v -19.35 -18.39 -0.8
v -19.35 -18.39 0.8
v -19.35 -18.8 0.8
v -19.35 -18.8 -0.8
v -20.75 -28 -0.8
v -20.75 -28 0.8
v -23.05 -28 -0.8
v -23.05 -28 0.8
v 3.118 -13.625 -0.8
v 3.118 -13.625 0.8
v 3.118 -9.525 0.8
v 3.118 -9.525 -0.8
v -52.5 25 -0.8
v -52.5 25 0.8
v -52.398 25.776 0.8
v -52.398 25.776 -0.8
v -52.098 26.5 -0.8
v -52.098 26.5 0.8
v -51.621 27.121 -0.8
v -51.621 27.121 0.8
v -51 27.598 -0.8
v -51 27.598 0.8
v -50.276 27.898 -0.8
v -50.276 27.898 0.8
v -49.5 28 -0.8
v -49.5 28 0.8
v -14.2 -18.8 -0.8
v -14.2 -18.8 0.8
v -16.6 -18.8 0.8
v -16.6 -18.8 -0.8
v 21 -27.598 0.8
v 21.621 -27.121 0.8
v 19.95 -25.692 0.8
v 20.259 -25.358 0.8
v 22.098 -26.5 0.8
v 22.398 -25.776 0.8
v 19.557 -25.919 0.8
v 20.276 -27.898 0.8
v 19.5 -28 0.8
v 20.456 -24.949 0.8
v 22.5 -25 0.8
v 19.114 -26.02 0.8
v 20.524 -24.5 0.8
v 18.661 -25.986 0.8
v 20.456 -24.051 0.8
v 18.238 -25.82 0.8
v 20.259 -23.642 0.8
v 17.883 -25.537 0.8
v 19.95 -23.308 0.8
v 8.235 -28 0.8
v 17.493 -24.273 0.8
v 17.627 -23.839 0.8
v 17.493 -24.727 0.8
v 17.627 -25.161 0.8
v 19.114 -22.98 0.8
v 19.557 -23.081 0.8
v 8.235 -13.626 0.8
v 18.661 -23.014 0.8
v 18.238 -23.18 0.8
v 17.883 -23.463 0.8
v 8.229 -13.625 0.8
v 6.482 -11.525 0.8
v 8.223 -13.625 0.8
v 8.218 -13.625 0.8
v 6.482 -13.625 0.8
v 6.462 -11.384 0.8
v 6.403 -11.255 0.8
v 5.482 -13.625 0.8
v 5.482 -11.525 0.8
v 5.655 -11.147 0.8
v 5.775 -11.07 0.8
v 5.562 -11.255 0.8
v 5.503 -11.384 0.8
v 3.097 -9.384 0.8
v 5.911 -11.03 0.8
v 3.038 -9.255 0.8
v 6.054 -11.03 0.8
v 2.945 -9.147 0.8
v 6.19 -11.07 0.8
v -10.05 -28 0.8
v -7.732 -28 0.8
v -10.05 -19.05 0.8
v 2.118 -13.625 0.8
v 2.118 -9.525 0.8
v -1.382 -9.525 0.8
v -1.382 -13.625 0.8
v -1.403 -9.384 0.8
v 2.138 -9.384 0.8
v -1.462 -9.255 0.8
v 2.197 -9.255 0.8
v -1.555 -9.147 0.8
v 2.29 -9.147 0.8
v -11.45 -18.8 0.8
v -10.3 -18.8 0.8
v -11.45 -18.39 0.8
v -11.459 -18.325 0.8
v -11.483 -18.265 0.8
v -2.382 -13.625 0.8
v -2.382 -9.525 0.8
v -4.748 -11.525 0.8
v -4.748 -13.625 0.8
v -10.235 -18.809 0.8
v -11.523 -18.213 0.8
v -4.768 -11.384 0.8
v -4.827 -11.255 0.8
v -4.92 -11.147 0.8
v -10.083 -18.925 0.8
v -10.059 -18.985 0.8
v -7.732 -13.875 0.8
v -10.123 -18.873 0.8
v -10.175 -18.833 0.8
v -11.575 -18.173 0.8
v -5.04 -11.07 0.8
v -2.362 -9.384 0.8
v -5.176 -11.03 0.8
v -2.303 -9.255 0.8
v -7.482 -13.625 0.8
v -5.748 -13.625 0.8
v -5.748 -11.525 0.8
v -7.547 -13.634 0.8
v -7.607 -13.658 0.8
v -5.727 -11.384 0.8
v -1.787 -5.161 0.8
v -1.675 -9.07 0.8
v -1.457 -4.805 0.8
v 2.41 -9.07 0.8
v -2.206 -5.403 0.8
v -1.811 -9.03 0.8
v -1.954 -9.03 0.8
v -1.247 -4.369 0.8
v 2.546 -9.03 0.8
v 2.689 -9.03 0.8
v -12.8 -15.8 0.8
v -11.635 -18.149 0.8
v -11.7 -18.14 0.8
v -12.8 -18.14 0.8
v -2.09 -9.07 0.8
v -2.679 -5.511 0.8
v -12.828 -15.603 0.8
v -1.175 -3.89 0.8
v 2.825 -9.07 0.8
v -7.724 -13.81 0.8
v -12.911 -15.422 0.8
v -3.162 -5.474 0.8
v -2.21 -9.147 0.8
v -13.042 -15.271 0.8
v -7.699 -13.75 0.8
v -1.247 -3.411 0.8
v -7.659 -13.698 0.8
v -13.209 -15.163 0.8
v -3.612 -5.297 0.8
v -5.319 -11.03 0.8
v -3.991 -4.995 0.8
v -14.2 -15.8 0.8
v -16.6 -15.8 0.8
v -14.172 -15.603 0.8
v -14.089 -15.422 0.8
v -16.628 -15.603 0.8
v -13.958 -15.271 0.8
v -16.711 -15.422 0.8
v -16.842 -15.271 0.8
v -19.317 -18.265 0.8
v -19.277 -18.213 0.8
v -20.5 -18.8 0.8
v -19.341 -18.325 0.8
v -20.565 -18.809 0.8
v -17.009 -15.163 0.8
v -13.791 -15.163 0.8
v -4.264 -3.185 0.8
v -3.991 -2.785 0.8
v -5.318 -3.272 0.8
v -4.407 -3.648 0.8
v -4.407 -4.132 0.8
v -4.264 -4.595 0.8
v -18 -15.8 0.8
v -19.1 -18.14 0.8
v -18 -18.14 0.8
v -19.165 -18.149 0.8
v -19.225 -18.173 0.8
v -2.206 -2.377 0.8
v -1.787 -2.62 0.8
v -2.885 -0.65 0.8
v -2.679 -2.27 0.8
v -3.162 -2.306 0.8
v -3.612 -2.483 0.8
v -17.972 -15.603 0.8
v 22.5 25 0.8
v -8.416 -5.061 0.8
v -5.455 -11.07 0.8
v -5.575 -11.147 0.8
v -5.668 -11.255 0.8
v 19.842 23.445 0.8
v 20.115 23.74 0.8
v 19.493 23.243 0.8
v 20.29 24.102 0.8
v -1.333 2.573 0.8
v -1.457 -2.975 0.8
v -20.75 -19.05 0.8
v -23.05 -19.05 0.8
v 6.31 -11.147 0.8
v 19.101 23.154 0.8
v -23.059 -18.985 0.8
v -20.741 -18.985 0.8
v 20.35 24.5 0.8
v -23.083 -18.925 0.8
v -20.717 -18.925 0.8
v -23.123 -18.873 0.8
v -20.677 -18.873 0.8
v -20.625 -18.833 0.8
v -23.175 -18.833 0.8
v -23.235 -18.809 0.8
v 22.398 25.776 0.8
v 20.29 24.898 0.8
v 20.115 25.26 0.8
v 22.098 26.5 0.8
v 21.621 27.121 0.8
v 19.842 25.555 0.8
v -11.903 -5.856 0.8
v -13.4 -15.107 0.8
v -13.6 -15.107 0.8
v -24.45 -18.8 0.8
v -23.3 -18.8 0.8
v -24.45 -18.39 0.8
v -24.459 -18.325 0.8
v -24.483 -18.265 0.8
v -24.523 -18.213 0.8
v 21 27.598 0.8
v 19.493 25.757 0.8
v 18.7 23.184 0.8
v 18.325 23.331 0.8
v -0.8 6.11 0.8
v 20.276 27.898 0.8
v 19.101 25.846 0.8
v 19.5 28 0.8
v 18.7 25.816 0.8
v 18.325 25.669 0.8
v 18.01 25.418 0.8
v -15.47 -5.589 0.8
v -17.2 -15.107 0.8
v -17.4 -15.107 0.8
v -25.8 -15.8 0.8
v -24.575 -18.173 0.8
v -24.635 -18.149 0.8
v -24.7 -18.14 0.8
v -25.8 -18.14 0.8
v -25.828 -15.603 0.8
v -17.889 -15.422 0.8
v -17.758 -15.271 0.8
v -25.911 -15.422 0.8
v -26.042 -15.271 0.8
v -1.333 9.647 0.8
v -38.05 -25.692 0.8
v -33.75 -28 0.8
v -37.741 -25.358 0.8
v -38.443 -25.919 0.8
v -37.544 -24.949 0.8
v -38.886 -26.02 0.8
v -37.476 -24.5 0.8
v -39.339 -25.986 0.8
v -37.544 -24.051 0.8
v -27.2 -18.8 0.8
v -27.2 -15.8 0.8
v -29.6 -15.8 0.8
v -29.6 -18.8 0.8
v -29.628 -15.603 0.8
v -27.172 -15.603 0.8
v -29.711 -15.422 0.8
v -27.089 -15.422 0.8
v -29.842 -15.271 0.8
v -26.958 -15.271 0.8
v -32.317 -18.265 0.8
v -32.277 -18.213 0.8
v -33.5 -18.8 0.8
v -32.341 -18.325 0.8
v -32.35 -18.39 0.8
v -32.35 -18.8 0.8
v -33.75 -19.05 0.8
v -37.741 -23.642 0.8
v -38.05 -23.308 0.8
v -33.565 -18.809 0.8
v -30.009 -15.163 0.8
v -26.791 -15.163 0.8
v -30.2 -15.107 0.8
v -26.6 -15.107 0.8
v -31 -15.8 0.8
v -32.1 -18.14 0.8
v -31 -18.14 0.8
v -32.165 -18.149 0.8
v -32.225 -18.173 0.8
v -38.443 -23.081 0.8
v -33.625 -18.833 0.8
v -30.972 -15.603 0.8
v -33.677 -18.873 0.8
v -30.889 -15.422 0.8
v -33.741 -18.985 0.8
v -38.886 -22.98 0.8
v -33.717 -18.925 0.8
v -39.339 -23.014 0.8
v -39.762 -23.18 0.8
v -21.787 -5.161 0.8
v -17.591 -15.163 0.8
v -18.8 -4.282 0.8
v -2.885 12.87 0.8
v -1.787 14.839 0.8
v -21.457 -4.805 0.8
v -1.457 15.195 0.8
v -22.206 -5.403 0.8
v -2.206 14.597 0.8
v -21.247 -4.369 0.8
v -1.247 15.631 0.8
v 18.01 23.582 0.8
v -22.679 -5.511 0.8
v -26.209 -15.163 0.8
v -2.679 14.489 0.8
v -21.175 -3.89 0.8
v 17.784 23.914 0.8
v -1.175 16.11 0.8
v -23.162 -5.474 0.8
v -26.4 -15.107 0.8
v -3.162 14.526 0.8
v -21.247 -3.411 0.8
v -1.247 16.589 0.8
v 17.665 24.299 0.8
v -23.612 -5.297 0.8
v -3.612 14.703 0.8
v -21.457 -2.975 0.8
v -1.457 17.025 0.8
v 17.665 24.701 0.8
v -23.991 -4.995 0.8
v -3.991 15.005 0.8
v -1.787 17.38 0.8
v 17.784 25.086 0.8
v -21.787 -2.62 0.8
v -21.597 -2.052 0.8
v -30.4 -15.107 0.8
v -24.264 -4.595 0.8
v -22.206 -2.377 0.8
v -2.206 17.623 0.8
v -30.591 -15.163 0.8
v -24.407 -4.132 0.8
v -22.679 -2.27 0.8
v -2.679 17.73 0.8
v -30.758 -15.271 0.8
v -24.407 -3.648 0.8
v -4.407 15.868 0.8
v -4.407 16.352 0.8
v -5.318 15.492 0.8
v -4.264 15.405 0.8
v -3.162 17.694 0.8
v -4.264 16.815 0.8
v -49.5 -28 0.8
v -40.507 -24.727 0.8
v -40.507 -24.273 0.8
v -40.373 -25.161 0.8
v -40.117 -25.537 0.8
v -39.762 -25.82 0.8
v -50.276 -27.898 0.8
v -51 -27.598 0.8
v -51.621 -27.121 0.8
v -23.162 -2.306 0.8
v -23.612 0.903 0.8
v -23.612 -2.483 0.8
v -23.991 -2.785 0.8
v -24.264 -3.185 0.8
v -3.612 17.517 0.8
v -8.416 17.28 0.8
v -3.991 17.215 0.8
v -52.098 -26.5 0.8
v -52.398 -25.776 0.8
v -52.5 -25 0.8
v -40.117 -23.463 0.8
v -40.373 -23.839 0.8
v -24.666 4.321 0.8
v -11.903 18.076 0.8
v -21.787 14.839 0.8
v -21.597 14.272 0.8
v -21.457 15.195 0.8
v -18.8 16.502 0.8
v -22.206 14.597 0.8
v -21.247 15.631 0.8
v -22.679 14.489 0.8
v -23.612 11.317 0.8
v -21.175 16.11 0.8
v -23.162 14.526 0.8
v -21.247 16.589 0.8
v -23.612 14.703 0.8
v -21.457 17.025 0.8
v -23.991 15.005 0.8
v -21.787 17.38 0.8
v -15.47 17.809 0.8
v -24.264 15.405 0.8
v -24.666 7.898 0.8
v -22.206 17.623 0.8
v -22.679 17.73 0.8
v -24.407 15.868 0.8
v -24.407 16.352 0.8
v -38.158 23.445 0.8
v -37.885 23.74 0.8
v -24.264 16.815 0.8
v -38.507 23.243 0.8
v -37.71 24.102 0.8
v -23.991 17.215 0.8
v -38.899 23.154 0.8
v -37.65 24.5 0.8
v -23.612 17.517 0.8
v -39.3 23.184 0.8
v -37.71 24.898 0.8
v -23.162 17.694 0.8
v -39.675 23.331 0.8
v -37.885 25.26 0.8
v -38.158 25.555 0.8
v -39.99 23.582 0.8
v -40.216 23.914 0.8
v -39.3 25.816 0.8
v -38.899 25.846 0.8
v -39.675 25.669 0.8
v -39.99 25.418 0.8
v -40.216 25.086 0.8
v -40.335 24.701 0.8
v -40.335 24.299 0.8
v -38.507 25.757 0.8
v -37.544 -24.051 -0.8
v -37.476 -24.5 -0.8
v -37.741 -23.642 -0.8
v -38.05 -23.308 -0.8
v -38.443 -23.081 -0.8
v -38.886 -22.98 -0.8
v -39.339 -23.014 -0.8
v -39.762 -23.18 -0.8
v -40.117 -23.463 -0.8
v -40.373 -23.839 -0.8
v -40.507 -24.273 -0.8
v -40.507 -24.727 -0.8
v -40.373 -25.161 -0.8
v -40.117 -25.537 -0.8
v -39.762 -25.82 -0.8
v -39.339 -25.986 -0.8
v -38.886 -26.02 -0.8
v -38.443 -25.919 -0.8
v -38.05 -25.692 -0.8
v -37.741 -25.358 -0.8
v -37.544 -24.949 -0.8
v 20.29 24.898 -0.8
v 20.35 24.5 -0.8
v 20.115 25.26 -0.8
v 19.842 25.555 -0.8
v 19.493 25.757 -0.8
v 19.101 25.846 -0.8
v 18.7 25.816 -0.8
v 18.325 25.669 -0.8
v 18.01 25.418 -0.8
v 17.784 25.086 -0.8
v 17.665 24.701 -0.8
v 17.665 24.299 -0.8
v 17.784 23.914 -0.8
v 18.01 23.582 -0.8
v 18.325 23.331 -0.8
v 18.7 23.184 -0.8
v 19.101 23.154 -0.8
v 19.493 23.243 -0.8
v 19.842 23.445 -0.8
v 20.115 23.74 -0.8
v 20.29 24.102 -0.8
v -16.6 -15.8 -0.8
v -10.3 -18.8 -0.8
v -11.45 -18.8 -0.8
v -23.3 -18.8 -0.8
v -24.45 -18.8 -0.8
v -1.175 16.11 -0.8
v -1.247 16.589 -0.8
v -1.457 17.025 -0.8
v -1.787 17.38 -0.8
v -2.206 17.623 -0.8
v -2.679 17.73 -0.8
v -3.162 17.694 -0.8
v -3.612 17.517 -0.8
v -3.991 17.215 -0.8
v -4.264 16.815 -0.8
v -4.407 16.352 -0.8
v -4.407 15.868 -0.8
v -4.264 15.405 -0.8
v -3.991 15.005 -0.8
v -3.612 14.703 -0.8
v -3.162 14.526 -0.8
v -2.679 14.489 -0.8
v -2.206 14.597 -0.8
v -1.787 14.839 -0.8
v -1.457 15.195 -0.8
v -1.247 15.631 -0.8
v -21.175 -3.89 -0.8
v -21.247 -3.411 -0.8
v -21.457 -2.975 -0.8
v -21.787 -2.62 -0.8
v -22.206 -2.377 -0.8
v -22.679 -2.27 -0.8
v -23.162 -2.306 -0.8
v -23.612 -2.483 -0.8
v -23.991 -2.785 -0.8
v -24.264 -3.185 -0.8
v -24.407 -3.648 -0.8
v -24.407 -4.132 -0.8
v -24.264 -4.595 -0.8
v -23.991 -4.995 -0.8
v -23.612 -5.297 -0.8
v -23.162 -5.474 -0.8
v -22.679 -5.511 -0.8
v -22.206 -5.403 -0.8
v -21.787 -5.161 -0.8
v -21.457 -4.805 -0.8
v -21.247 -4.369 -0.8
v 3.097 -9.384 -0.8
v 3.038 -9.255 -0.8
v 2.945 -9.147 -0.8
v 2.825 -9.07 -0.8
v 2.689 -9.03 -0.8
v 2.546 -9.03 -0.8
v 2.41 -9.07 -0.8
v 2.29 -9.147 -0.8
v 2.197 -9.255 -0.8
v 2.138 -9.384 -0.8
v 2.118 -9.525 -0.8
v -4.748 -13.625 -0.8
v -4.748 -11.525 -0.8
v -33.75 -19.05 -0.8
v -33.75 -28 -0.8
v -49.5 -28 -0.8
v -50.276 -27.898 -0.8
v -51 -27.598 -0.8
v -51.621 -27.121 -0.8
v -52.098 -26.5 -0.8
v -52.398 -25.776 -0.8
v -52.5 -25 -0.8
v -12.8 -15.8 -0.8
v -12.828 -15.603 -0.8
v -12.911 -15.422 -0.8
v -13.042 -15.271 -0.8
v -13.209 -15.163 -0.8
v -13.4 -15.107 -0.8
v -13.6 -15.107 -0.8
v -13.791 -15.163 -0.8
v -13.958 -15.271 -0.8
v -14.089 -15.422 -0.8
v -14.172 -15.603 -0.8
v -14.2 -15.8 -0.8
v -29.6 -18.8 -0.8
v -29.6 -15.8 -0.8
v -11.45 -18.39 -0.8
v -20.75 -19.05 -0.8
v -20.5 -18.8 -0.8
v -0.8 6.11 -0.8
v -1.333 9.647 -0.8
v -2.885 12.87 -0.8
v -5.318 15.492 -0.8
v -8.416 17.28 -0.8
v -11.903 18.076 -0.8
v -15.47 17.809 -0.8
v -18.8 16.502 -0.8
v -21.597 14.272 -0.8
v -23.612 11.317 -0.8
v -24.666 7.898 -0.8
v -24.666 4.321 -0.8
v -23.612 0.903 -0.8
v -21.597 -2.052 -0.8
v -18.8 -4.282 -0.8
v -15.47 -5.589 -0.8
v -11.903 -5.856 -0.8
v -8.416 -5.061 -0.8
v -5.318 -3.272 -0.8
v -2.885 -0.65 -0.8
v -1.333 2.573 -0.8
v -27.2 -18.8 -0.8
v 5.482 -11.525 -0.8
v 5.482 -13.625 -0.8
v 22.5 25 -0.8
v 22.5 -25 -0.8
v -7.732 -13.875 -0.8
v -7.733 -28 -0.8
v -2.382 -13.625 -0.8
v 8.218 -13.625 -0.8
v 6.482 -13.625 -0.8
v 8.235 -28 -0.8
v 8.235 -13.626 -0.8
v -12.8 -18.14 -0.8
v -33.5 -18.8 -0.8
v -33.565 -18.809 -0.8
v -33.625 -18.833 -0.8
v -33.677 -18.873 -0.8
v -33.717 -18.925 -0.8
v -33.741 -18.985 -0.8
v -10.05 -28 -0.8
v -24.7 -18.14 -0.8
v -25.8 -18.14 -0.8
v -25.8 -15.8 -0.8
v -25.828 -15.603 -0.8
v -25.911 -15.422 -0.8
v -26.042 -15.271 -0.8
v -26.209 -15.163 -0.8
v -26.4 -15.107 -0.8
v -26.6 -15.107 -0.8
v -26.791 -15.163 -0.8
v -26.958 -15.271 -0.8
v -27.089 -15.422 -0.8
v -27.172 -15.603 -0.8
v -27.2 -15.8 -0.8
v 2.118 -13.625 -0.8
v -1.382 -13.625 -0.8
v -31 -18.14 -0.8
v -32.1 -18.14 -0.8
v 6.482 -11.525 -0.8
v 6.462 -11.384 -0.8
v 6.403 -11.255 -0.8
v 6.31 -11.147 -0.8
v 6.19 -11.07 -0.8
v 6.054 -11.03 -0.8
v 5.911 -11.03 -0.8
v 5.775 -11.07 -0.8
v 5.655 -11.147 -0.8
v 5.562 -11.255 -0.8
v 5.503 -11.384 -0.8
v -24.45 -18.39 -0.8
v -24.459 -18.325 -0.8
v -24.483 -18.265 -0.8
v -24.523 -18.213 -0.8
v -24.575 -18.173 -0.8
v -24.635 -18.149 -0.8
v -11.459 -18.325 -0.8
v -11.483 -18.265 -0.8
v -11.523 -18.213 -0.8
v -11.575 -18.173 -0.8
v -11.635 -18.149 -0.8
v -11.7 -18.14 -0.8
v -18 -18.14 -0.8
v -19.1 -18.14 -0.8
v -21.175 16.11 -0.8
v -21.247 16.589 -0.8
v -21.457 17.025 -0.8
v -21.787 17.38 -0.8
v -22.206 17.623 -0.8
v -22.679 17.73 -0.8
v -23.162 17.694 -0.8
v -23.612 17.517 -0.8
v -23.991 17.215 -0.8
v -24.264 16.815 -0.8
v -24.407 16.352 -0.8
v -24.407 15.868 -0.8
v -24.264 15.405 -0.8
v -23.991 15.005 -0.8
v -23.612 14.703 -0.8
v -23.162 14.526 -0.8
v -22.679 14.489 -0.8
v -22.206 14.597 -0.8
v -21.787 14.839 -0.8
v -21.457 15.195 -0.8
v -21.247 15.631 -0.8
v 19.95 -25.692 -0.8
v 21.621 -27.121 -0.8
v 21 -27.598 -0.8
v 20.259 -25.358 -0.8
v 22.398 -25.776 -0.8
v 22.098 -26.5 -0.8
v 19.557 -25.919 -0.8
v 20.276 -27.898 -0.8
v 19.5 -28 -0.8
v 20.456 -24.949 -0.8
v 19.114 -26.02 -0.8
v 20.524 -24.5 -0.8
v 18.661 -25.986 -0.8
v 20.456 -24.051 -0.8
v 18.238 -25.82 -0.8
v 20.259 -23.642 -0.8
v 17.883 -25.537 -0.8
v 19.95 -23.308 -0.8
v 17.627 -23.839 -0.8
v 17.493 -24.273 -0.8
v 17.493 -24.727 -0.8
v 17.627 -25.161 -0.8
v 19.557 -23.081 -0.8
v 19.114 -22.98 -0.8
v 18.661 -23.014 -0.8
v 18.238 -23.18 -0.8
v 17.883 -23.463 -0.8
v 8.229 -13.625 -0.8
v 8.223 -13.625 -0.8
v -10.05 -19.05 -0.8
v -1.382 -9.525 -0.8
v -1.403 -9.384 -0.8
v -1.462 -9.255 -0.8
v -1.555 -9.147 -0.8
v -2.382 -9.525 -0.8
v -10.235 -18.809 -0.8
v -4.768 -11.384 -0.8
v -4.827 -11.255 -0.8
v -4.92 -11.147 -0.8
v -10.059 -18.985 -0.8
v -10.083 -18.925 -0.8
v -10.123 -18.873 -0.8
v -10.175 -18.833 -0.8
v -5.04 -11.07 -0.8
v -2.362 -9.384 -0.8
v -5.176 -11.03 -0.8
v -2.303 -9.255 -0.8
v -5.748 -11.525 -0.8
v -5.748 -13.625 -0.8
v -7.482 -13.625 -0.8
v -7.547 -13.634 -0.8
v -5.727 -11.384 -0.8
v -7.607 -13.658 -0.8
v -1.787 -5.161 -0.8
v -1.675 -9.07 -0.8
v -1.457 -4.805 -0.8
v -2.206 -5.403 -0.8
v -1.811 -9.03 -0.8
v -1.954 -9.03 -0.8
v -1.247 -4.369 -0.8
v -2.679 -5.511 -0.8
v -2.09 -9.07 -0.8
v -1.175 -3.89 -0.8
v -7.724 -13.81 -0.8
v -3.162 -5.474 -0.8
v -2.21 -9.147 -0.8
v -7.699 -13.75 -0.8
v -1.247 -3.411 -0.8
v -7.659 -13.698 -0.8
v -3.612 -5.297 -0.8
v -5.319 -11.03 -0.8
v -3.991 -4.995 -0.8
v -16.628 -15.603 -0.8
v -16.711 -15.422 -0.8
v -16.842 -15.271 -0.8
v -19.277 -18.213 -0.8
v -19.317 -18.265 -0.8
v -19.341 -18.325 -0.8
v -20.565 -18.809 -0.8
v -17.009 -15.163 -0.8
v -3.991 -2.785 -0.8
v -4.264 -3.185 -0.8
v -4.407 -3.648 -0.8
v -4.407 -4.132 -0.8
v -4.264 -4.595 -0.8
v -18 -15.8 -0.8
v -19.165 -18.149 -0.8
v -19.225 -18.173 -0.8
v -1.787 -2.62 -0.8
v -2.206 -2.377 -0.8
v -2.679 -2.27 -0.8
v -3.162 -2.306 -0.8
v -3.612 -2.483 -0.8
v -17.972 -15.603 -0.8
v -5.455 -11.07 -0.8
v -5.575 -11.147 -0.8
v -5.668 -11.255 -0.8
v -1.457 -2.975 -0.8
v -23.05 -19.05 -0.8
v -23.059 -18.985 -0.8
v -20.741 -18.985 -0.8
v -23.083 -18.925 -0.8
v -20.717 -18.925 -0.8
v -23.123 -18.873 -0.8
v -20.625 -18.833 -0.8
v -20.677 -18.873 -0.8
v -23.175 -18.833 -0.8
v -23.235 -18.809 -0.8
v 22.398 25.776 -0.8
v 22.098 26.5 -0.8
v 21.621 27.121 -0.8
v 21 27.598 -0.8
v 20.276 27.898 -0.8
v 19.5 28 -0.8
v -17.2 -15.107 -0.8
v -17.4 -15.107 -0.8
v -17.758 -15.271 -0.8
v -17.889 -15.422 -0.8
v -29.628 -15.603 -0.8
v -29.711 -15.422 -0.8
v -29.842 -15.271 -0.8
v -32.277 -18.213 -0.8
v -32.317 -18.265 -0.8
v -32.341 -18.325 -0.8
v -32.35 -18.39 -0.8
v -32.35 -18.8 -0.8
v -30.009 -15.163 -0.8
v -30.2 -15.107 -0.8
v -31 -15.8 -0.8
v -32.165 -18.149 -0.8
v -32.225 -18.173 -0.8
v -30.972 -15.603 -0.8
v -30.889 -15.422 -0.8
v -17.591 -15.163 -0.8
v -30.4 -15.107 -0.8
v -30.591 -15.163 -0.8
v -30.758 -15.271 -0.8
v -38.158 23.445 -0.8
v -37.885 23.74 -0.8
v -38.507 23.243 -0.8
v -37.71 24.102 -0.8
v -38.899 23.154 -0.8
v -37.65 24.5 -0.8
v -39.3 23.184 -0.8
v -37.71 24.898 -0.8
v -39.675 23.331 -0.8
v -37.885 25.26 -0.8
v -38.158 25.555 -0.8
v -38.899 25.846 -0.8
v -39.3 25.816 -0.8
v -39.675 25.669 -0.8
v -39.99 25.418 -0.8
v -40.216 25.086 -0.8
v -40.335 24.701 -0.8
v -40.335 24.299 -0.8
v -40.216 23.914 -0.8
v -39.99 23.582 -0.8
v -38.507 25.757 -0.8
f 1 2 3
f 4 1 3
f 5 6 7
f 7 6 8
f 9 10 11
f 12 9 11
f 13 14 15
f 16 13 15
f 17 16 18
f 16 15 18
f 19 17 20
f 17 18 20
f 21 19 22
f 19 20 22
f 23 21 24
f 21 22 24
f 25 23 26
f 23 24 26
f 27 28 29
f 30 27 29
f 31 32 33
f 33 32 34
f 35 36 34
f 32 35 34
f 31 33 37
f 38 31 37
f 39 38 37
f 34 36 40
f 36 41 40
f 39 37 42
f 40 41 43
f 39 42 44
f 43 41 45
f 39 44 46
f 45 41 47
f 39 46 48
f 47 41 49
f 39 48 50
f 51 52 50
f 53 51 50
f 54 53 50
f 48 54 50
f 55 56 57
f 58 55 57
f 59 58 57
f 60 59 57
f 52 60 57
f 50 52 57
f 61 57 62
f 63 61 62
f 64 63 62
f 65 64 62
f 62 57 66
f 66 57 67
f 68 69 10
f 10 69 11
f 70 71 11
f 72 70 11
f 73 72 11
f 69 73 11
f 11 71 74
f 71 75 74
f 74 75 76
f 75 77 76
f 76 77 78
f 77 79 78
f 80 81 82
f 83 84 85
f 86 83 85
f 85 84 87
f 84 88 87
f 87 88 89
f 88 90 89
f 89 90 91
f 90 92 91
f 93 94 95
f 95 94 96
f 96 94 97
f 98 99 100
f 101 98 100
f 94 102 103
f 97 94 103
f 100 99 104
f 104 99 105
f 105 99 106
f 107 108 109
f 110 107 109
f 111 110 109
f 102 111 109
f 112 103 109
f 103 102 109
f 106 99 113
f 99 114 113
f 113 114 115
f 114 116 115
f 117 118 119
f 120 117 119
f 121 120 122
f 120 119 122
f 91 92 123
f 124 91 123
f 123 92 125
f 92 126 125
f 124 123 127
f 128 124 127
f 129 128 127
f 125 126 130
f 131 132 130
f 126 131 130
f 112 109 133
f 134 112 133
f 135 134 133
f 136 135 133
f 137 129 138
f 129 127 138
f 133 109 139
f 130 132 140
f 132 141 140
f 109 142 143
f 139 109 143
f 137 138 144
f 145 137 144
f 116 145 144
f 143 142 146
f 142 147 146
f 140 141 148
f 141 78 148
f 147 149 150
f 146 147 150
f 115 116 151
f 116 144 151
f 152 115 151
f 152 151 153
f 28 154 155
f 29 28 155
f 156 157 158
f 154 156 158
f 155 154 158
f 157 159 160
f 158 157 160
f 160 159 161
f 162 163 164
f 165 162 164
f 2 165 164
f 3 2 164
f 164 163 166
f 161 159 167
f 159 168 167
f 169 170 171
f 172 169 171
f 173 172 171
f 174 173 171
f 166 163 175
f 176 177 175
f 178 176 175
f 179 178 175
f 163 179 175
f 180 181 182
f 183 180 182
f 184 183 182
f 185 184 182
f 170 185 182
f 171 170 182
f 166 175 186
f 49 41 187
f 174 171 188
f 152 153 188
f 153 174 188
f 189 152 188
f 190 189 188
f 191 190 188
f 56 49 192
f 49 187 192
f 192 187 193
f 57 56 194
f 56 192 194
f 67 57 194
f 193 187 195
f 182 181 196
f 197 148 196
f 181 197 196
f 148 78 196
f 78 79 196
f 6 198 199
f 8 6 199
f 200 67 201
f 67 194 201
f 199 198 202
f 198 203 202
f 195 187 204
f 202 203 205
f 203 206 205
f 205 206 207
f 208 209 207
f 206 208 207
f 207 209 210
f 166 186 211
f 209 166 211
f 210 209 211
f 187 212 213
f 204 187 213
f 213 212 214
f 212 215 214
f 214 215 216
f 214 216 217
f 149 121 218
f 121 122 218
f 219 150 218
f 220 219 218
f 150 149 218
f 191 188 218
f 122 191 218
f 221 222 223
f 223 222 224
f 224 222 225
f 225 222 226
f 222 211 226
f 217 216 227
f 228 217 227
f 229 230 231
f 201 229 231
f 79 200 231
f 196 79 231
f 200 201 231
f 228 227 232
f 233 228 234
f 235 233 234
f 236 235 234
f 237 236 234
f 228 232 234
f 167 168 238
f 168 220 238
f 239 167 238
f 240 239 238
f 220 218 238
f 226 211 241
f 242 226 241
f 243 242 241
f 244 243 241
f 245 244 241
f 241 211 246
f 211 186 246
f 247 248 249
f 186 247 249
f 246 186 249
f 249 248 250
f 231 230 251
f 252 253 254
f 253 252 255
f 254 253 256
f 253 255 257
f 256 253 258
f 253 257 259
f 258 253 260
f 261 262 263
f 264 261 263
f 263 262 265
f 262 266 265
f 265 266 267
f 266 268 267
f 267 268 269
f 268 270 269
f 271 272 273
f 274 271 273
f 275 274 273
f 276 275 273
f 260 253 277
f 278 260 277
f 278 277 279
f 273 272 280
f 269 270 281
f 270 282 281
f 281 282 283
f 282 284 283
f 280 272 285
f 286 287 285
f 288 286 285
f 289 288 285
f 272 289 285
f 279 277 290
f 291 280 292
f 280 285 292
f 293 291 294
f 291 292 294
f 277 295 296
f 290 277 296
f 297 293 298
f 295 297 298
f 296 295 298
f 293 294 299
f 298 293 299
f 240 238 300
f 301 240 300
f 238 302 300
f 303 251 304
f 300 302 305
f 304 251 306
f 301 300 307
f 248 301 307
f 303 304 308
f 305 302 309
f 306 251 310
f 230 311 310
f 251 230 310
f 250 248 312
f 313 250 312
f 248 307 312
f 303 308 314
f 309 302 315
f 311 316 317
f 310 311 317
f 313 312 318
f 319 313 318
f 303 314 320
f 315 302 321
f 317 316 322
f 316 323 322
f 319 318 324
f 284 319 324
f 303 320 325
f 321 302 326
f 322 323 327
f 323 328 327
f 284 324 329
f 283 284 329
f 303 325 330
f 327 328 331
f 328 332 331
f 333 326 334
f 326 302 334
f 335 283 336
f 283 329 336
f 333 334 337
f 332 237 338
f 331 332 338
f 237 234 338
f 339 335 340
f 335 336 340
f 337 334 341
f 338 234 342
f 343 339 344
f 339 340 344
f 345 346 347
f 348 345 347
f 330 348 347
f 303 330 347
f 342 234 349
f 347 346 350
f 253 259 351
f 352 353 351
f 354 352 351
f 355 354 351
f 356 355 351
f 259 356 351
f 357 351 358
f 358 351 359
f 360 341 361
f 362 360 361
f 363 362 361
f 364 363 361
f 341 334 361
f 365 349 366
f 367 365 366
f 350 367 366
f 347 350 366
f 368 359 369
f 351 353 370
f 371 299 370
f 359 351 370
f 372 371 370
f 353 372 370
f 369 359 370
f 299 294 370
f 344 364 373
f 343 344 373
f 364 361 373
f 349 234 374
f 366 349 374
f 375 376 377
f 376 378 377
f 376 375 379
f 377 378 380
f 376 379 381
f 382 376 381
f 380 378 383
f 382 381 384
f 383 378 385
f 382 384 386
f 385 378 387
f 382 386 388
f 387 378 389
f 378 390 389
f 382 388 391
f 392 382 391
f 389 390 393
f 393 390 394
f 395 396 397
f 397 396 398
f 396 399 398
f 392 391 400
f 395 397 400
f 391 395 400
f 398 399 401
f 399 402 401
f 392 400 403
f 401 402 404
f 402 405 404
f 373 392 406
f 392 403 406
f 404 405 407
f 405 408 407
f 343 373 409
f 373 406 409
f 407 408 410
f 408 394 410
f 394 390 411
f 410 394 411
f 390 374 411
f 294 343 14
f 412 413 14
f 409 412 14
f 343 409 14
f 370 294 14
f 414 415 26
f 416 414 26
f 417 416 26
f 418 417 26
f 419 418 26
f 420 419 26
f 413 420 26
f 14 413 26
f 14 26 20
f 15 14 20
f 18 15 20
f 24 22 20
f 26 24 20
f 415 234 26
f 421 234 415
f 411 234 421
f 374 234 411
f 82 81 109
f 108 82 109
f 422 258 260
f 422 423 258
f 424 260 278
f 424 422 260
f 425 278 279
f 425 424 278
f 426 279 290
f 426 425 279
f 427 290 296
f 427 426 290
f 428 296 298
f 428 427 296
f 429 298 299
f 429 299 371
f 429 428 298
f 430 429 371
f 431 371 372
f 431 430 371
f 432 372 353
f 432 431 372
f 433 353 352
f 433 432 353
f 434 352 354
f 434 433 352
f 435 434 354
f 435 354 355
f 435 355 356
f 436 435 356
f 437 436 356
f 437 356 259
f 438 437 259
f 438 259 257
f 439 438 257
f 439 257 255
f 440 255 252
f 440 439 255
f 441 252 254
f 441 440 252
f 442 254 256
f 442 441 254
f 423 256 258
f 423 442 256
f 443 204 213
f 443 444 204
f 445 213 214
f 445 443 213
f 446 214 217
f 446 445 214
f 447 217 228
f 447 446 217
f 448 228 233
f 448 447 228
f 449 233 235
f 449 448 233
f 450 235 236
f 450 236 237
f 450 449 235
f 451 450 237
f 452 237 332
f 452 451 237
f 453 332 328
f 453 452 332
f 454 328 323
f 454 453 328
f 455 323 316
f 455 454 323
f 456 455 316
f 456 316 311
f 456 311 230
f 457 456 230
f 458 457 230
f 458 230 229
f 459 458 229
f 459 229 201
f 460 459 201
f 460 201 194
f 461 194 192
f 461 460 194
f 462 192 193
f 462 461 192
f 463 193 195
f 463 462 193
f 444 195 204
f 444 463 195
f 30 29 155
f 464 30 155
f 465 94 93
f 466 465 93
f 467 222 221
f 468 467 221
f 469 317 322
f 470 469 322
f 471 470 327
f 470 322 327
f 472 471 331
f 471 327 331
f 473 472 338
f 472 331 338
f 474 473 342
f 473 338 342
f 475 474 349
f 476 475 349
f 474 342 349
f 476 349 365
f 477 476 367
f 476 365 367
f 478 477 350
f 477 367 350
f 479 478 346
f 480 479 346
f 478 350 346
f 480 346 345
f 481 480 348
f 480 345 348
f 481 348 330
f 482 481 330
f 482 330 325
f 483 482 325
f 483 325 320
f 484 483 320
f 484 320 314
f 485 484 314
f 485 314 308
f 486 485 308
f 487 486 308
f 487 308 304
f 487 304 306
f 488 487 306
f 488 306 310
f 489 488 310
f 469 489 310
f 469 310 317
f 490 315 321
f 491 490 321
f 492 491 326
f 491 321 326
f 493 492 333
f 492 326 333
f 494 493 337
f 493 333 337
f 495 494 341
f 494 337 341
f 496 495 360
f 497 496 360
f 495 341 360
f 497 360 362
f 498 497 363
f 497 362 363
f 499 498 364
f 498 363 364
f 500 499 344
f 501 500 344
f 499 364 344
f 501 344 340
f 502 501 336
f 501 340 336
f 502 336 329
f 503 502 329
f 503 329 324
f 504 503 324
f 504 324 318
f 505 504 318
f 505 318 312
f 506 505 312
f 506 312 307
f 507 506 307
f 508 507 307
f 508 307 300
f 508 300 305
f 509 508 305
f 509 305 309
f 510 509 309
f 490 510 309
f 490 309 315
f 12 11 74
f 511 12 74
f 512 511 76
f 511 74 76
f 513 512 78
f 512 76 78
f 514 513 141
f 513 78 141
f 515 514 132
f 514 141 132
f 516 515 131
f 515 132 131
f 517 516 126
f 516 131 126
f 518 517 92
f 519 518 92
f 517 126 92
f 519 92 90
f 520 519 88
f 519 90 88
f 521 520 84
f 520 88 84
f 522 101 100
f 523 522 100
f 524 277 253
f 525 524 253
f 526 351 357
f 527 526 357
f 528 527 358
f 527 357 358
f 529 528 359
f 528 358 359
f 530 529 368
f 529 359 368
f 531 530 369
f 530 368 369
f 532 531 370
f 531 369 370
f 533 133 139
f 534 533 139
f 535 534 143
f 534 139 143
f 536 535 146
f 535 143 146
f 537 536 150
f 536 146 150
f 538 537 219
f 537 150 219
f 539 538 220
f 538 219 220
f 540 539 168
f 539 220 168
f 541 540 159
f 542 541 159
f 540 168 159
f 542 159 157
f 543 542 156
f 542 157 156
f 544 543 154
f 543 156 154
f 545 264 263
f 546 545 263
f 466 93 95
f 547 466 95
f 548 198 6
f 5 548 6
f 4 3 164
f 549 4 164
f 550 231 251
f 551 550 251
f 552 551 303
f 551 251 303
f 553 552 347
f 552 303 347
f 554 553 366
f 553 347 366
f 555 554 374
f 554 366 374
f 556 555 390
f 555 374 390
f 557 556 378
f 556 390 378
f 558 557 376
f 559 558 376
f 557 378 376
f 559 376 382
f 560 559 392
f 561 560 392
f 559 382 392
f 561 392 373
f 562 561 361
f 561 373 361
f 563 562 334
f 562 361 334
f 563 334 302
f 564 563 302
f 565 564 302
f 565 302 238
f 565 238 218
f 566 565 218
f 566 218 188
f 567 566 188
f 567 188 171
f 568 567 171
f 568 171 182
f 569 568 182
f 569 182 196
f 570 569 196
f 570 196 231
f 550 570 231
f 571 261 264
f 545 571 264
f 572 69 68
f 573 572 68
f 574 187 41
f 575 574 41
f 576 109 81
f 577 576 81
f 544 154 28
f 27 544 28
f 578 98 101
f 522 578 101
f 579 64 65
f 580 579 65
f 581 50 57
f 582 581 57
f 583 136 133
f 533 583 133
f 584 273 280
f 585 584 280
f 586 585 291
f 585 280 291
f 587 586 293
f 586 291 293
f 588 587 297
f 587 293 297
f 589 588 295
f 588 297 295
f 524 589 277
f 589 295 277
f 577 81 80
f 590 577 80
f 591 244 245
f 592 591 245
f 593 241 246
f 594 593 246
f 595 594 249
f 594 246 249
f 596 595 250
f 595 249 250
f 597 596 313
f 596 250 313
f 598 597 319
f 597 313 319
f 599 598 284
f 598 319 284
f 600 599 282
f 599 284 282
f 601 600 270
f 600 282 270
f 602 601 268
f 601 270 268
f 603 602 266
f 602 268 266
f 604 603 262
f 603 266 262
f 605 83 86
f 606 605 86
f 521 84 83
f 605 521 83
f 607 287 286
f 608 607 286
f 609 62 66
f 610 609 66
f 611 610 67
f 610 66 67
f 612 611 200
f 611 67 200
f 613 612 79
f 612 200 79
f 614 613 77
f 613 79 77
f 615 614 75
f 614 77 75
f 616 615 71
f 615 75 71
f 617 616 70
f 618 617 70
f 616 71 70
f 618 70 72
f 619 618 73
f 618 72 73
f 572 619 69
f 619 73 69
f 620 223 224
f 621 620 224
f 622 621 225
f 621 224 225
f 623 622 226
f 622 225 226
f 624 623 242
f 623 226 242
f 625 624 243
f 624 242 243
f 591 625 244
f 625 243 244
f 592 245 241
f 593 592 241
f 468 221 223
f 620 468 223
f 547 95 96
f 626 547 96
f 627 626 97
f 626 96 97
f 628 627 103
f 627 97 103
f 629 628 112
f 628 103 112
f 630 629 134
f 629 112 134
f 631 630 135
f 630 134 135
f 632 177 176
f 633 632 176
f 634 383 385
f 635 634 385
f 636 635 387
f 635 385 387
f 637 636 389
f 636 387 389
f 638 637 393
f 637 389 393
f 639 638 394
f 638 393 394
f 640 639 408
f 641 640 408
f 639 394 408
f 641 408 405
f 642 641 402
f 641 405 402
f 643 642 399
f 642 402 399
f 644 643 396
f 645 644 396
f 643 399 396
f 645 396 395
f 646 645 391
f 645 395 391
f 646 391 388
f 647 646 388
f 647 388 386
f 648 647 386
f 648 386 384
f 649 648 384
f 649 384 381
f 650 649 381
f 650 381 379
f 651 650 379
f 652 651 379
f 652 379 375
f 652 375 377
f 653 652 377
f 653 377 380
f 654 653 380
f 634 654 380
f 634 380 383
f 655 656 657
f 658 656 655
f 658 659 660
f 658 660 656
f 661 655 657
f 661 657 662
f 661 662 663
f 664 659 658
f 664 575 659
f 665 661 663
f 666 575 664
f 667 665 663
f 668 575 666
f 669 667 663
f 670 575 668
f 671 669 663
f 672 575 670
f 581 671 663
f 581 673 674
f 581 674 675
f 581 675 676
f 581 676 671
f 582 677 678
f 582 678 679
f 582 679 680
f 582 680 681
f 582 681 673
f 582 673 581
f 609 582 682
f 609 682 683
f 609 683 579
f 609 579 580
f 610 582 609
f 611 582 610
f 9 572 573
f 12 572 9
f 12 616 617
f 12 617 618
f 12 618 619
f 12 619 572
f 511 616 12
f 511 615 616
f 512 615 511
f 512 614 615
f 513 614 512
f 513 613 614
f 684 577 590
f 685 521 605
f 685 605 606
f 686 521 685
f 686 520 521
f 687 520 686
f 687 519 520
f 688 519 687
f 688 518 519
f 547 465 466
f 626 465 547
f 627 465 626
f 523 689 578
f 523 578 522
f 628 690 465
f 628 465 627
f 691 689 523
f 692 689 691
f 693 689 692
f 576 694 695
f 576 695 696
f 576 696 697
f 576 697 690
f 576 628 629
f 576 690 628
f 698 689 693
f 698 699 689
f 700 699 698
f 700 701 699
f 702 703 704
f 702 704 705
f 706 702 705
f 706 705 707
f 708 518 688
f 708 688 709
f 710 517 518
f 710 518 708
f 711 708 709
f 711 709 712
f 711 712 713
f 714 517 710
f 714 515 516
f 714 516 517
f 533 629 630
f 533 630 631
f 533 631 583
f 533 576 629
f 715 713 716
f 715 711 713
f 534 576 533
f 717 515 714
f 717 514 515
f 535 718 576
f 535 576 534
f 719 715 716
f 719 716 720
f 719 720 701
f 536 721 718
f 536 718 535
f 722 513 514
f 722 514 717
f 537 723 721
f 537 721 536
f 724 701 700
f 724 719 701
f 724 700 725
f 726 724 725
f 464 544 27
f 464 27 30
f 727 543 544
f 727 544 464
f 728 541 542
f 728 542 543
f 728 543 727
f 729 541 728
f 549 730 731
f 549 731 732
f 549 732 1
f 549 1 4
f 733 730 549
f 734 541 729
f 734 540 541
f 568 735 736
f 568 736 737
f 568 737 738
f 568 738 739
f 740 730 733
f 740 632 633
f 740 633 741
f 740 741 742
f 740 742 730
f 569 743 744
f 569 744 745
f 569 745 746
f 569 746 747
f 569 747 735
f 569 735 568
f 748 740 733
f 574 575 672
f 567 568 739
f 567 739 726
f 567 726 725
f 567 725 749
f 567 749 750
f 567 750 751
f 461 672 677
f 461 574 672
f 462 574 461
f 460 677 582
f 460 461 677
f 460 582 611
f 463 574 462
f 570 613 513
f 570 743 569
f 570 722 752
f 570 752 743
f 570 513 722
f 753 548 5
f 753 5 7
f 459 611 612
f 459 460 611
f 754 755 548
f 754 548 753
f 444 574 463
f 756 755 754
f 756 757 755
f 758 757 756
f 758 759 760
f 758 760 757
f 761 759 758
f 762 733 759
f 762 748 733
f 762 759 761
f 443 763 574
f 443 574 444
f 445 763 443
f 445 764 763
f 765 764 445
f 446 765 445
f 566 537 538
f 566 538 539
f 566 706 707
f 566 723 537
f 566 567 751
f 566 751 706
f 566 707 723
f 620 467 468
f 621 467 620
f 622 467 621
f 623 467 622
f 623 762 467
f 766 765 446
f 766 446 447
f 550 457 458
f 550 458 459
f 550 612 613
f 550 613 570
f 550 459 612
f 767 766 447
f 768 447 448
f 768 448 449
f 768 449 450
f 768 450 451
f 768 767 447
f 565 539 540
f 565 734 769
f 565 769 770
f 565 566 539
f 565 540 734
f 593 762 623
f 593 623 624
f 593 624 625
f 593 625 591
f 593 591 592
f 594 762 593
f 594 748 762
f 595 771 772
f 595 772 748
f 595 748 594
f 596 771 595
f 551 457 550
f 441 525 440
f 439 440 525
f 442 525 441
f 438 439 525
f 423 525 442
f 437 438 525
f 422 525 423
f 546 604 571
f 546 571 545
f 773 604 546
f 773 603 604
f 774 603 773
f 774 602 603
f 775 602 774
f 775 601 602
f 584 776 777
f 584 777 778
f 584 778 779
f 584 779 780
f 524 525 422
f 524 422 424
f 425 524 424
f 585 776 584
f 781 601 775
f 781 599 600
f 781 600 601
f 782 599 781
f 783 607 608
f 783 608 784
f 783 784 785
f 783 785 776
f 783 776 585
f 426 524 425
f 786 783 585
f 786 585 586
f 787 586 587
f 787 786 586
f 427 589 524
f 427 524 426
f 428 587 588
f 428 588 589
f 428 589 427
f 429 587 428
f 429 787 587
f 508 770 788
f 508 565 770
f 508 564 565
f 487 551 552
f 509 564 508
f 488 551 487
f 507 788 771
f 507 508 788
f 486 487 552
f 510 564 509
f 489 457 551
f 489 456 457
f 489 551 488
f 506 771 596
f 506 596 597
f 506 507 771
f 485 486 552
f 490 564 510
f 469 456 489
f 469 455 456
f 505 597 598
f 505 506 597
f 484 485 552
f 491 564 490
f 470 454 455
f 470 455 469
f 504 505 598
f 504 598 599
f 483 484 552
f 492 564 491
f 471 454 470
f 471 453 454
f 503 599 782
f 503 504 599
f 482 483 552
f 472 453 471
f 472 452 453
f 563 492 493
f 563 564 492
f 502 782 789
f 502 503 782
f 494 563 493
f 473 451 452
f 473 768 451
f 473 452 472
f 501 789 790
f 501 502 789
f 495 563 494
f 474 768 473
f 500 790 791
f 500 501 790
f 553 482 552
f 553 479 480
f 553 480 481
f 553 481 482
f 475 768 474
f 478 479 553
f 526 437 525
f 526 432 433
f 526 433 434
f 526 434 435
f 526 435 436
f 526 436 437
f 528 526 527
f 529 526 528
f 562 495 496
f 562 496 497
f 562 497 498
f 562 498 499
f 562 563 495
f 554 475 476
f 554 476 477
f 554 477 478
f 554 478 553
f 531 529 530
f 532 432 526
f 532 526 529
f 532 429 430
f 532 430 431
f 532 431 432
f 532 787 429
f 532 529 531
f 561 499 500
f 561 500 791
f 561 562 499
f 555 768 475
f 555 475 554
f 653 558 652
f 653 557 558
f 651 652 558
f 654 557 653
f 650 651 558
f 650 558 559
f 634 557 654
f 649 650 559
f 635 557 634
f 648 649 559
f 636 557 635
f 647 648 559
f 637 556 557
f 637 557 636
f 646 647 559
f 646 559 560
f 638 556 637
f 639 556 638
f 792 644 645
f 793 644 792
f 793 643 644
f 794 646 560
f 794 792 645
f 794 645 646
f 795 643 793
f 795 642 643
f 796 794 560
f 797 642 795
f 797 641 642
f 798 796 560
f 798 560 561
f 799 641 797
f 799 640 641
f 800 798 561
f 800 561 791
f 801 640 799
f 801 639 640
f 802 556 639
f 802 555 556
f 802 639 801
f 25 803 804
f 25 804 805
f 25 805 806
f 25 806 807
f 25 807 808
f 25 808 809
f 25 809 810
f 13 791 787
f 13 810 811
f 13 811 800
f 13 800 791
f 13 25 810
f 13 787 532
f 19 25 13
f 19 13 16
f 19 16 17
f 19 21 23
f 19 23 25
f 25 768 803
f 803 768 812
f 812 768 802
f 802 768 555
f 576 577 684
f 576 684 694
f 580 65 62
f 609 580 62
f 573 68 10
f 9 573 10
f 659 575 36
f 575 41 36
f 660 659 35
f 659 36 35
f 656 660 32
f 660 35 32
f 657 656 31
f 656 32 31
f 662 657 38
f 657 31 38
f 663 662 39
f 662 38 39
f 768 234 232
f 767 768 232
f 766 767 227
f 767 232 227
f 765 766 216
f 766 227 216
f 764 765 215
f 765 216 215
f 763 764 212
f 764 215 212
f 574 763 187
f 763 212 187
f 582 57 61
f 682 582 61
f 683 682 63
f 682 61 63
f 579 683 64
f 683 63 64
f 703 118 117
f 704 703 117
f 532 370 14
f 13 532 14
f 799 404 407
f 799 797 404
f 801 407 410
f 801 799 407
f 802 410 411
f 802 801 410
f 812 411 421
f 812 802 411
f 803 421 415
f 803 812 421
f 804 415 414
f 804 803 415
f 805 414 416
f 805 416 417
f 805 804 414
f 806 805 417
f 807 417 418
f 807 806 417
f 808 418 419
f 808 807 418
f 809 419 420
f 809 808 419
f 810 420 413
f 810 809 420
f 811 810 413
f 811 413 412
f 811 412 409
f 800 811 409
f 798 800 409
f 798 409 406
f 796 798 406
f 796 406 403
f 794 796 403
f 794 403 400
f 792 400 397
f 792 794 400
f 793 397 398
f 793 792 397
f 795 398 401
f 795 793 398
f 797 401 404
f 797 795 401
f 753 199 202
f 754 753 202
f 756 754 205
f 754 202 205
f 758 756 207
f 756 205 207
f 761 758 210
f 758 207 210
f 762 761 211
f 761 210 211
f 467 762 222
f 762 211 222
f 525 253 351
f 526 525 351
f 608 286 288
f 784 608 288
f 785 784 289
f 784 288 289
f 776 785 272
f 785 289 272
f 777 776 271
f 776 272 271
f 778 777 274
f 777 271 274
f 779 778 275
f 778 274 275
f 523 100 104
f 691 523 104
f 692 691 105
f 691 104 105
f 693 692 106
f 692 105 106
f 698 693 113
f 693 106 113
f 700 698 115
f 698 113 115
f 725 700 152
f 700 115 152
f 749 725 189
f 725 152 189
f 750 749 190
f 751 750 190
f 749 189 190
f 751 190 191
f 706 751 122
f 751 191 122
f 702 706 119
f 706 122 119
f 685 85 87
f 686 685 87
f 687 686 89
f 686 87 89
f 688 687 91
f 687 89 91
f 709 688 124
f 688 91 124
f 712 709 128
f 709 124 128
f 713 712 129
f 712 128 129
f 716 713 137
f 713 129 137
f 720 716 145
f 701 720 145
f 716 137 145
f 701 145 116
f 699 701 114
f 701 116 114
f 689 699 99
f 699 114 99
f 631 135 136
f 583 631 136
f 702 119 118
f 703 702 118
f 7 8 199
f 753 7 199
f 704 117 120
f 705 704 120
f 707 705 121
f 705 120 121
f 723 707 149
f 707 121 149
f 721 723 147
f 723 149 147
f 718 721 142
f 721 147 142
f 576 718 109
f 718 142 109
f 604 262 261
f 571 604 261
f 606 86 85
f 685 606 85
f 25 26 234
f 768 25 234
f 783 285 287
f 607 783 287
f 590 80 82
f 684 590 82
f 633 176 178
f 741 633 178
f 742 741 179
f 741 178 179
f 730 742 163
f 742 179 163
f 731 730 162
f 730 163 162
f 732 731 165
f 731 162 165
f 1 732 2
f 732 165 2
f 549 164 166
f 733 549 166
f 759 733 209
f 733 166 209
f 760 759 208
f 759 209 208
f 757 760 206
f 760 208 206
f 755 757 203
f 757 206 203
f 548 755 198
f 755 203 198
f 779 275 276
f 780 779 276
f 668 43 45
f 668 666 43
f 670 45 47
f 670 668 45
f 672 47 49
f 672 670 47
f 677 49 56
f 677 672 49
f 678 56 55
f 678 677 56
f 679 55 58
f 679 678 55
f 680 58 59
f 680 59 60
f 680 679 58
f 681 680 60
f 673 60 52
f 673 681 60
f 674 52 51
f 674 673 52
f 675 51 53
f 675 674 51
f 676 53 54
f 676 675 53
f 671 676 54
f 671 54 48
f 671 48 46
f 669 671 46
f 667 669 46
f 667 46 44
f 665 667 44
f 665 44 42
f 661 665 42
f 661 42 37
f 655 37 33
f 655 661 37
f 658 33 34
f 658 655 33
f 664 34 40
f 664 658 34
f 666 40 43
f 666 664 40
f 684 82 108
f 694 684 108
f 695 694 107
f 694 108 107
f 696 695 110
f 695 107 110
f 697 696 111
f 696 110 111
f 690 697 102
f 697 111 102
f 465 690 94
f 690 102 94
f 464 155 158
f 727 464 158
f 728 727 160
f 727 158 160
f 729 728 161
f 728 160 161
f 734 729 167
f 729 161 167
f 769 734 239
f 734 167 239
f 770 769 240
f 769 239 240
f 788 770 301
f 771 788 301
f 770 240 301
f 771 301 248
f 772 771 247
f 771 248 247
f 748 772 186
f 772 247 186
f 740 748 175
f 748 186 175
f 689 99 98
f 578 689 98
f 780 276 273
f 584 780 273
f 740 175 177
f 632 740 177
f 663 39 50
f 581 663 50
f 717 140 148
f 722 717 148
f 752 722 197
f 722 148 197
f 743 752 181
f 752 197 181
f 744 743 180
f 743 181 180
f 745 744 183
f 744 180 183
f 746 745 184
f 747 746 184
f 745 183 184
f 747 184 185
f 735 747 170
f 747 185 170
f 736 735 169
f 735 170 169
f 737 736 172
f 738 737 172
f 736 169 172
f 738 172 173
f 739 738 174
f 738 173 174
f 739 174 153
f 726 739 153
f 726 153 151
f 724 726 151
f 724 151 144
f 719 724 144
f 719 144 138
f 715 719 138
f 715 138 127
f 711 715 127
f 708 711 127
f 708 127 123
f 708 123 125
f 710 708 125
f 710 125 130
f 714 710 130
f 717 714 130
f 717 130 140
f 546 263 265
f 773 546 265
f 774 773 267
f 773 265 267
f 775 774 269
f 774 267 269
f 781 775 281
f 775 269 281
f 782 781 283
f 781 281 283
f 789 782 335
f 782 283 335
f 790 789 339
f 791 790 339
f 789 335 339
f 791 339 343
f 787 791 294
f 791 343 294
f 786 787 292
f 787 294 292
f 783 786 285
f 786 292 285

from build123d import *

# Parameters (mm, degrees)
SKETCH1_R           = 1.35
SKETCH1_R_2         = 1.524
BOSS_EXTRUDE1_DEPTH = 0.8
SKETCH2_R           = 1.625
SKETCH2_R_2         = 12
CUT_EXTRUDE1_DEPTH  = 51.919642575
BOSS_EXTRUDE2_DEPTH = 1.6
CUT_EXTRUDE2_DEPTH  = 60.521508717


with BuildPart() as part:
    # Sketch1 → Boss-Extrude1 (new, symmetric)
    with BuildSketch(Plane.XY):
        with BuildLine():
            Line((22.5, 25), (22.5, -25))
            ThreePointArc((22.5, -25), (21.621320344, -27.121320344), (19.5, -28))
            Line((19.5, -28), (-39.5, -28))
            ThreePointArc((-39.5, -28), (-41.621320344, -27.121320344), (-42.5, -25))
            Line((-42.5, -25), (-42.5, 25))
            ThreePointArc((-42.5, 25), (-41.621320344, 27.121320344), (-39.5, 28))
            Line((-39.5, 28), (19.5, 28))
            ThreePointArc((19.5, 28), (21.621320344, 27.121320344), (22.5, 25))
        make_face()
        with Locations((-39, 24.5)):
            Circle(SKETCH1_R, mode=Mode.SUBTRACT)
        with Locations((-39, -24.5)):
            Circle(SKETCH1_R_2, mode=Mode.SUBTRACT)
        with Locations((19, -24.5)):
            Circle(SKETCH1_R_2, mode=Mode.SUBTRACT)
        with Locations((19, 24.5)):
            Circle(SKETCH1_R, mode=Mode.SUBTRACT)
    extrude(amount=BOSS_EXTRUDE1_DEPTH, both=True)

    # Sketch2 → Cut-Extrude1 (cut, through all)
    with BuildSketch(Plane.XY.offset(0.8)):
        with Locations((-2.799944405, 16.10995525)):
            Circle(SKETCH2_R)
        with Locations((-22.799944405, 16.10995525)):
            Circle(SKETCH2_R)
        with Locations((-22.799944405, -3.89004475)):
            Circle(SKETCH2_R)
        with Locations((-2.799944405, -3.89004475)):
            Circle(SKETCH2_R)
        with Locations((-12.799944405, 6.10995525)):
            Circle(SKETCH2_R_2)
    extrude(amount=-CUT_EXTRUDE1_DEPTH, mode=Mode.SUBTRACT)

    # Sketch4 → Boss-Extrude2 (add)
    with BuildSketch(Plane.XY.offset(0.8)):
        with BuildLine():
            Line((-49.5, 28), (-39.5, 28))
            ThreePointArc((-39.5, 28), (-41.621320344, 27.121320344), (-42.5, 25))
            Line((-42.5, 25), (-42.5, -25))
            ThreePointArc((-42.5, -25), (-41.621320344, -27.121320344), (-39.5, -28))
            Line((-39.5, -28), (-49.5, -28))
            ThreePointArc((-49.5, -28), (-51.621320344, -27.121320344), (-52.5, -25))
            Line((-52.5, -25), (-52.5, 25))
            ThreePointArc((-52.5, 25), (-51.621320344, 27.121320344), (-49.5, 28))
        make_face()
    extrude(amount=-BOSS_EXTRUDE2_DEPTH)

    # Sketch5 → Cut-Extrude2 (cut, through all)
    with BuildSketch(Plane.XY.offset(0.8)):
        with BuildLine():
            Line((-27.2, -18.8), (-29.6, -18.8))
            Line((-29.6, -18.8), (-29.6, -15.8))
            ThreePointArc((-29.6, -15.8), (-30.3, -15.1), (-31, -15.8))
            Line((-31, -15.8), (-31, -18.14))
            Line((-31, -18.14), (-32.1, -18.14))
            ThreePointArc((-32.1, -18.14), (-32.276776695, -18.213223305), (-32.35, -18.39))
            Line((-32.35, -18.39), (-32.35, -18.8))
            Line((-32.35, -18.8), (-33.5, -18.8))
            ThreePointArc((-33.5, -18.8), (-33.676776695, -18.873223305), (-33.75, -19.05))
            Line((-33.75, -19.05), (-33.75, -28))
            Line((-33.75, -28), (-23.05, -28))
            Line((-23.05, -28), (-23.05, -19.05))
            ThreePointArc((-23.05, -19.05), (-23.123223305, -18.873223305), (-23.3, -18.8))
            Line((-23.3, -18.8), (-24.45, -18.8))
            Line((-24.45, -18.8), (-24.45, -18.39))
            ThreePointArc((-24.45, -18.39), (-24.523223305, -18.213223305), (-24.7, -18.14))
            Line((-24.7, -18.14), (-25.8, -18.14))
            Line((-25.8, -18.14), (-25.8, -15.8))
            ThreePointArc((-25.8, -15.8), (-26.5, -15.1), (-27.2, -15.8))
            Line((-27.2, -15.8), (-27.2, -18.8))
        make_face()
        with BuildLine():
            Line((-14.2, -18.8), (-16.6, -18.8))
            Line((-16.6, -18.8), (-16.6, -15.8))
            ThreePointArc((-16.6, -15.8), (-17.3, -15.1), (-18, -15.8))
            Line((-18, -15.8), (-18, -18.14))
            Line((-18, -18.14), (-19.1, -18.14))
            ThreePointArc((-19.1, -18.14), (-19.276776695, -18.213223305), (-19.35, -18.39))
            Line((-19.35, -18.39), (-19.35, -18.8))
            Line((-19.35, -18.8), (-20.5, -18.8))
            ThreePointArc((-20.5, -18.8), (-20.676776695, -18.873223305), (-20.75, -19.05))
            Line((-20.75, -19.05), (-20.75, -28))
            Line((-20.75, -28), (-10.05, -28))
            Line((-10.05, -28), (-10.05, -19.05))
            ThreePointArc((-10.05, -19.05), (-10.123223305, -18.873223305), (-10.3, -18.8))
            Line((-10.3, -18.8), (-11.45, -18.8))
            Line((-11.45, -18.8), (-11.45, -18.39))
            ThreePointArc((-11.45, -18.39), (-11.523223305, -18.213223305), (-11.7, -18.14))
            Line((-11.7, -18.14), (-12.8, -18.14))
            Line((-12.8, -18.14), (-12.8, -15.8))
            ThreePointArc((-12.8, -15.8), (-13.5, -15.1), (-14.2, -15.8))
            Line((-14.2, -15.8), (-14.2, -18.8))
        make_face()
        with BuildLine():
            Line((-2.3825, -9.525), (-2.3825, -13.625))
            Line((-2.3825, -13.625), (-4.7475, -13.625))
            Line((-4.7475, -13.625), (-4.7475, -11.525))
            ThreePointArc((-4.7475, -11.525), (-5.2475, -11.025), (-5.7475, -11.525))
            Line((-5.7475, -11.525), (-5.7475, -13.625))
            Line((-5.7475, -13.625), (-7.4825, -13.625))
            ThreePointArc((-7.4825, -13.625), (-7.659276695, -13.698223305), (-7.7325, -13.875))
            Line((-7.7325, -13.875), (-7.7325, -28))
            Line((-7.7325, -28), (-7.426776695, -28))
            Line((-7.426776695, -28), (8.235, -28))
            Line((8.235, -28), (8.235, -13.625613252))
            ThreePointArc((8.235, -13.625613252), (8.226255371, -13.62515336), (8.2175, -13.625))
            Line((8.2175, -13.625), (6.4825, -13.625))
            Line((6.4825, -13.625), (6.4825, -11.525))
            ThreePointArc((6.4825, -11.525), (5.9825, -11.025), (5.4825, -11.525))
            Line((5.4825, -11.525), (5.4825, -13.625))
            Line((5.4825, -13.625), (3.1175, -13.625))
            Line((3.1175, -13.625), (3.1175, -9.525))
            ThreePointArc((3.1175, -9.525), (2.6175, -9.025), (2.1175, -9.525))
            Line((2.1175, -9.525), (2.1175, -13.625))
            Line((2.1175, -13.625), (-1.3825, -13.625))
            Line((-1.3825, -13.625), (-1.3825, -9.525))
            ThreePointArc((-1.3825, -9.525), (-1.8825, -9.025), (-2.3825, -9.525))
        make_face()
    extrude(amount=-CUT_EXTRUDE2_DEPTH, mode=Mode.SUBTRACT)


solid = part.part
